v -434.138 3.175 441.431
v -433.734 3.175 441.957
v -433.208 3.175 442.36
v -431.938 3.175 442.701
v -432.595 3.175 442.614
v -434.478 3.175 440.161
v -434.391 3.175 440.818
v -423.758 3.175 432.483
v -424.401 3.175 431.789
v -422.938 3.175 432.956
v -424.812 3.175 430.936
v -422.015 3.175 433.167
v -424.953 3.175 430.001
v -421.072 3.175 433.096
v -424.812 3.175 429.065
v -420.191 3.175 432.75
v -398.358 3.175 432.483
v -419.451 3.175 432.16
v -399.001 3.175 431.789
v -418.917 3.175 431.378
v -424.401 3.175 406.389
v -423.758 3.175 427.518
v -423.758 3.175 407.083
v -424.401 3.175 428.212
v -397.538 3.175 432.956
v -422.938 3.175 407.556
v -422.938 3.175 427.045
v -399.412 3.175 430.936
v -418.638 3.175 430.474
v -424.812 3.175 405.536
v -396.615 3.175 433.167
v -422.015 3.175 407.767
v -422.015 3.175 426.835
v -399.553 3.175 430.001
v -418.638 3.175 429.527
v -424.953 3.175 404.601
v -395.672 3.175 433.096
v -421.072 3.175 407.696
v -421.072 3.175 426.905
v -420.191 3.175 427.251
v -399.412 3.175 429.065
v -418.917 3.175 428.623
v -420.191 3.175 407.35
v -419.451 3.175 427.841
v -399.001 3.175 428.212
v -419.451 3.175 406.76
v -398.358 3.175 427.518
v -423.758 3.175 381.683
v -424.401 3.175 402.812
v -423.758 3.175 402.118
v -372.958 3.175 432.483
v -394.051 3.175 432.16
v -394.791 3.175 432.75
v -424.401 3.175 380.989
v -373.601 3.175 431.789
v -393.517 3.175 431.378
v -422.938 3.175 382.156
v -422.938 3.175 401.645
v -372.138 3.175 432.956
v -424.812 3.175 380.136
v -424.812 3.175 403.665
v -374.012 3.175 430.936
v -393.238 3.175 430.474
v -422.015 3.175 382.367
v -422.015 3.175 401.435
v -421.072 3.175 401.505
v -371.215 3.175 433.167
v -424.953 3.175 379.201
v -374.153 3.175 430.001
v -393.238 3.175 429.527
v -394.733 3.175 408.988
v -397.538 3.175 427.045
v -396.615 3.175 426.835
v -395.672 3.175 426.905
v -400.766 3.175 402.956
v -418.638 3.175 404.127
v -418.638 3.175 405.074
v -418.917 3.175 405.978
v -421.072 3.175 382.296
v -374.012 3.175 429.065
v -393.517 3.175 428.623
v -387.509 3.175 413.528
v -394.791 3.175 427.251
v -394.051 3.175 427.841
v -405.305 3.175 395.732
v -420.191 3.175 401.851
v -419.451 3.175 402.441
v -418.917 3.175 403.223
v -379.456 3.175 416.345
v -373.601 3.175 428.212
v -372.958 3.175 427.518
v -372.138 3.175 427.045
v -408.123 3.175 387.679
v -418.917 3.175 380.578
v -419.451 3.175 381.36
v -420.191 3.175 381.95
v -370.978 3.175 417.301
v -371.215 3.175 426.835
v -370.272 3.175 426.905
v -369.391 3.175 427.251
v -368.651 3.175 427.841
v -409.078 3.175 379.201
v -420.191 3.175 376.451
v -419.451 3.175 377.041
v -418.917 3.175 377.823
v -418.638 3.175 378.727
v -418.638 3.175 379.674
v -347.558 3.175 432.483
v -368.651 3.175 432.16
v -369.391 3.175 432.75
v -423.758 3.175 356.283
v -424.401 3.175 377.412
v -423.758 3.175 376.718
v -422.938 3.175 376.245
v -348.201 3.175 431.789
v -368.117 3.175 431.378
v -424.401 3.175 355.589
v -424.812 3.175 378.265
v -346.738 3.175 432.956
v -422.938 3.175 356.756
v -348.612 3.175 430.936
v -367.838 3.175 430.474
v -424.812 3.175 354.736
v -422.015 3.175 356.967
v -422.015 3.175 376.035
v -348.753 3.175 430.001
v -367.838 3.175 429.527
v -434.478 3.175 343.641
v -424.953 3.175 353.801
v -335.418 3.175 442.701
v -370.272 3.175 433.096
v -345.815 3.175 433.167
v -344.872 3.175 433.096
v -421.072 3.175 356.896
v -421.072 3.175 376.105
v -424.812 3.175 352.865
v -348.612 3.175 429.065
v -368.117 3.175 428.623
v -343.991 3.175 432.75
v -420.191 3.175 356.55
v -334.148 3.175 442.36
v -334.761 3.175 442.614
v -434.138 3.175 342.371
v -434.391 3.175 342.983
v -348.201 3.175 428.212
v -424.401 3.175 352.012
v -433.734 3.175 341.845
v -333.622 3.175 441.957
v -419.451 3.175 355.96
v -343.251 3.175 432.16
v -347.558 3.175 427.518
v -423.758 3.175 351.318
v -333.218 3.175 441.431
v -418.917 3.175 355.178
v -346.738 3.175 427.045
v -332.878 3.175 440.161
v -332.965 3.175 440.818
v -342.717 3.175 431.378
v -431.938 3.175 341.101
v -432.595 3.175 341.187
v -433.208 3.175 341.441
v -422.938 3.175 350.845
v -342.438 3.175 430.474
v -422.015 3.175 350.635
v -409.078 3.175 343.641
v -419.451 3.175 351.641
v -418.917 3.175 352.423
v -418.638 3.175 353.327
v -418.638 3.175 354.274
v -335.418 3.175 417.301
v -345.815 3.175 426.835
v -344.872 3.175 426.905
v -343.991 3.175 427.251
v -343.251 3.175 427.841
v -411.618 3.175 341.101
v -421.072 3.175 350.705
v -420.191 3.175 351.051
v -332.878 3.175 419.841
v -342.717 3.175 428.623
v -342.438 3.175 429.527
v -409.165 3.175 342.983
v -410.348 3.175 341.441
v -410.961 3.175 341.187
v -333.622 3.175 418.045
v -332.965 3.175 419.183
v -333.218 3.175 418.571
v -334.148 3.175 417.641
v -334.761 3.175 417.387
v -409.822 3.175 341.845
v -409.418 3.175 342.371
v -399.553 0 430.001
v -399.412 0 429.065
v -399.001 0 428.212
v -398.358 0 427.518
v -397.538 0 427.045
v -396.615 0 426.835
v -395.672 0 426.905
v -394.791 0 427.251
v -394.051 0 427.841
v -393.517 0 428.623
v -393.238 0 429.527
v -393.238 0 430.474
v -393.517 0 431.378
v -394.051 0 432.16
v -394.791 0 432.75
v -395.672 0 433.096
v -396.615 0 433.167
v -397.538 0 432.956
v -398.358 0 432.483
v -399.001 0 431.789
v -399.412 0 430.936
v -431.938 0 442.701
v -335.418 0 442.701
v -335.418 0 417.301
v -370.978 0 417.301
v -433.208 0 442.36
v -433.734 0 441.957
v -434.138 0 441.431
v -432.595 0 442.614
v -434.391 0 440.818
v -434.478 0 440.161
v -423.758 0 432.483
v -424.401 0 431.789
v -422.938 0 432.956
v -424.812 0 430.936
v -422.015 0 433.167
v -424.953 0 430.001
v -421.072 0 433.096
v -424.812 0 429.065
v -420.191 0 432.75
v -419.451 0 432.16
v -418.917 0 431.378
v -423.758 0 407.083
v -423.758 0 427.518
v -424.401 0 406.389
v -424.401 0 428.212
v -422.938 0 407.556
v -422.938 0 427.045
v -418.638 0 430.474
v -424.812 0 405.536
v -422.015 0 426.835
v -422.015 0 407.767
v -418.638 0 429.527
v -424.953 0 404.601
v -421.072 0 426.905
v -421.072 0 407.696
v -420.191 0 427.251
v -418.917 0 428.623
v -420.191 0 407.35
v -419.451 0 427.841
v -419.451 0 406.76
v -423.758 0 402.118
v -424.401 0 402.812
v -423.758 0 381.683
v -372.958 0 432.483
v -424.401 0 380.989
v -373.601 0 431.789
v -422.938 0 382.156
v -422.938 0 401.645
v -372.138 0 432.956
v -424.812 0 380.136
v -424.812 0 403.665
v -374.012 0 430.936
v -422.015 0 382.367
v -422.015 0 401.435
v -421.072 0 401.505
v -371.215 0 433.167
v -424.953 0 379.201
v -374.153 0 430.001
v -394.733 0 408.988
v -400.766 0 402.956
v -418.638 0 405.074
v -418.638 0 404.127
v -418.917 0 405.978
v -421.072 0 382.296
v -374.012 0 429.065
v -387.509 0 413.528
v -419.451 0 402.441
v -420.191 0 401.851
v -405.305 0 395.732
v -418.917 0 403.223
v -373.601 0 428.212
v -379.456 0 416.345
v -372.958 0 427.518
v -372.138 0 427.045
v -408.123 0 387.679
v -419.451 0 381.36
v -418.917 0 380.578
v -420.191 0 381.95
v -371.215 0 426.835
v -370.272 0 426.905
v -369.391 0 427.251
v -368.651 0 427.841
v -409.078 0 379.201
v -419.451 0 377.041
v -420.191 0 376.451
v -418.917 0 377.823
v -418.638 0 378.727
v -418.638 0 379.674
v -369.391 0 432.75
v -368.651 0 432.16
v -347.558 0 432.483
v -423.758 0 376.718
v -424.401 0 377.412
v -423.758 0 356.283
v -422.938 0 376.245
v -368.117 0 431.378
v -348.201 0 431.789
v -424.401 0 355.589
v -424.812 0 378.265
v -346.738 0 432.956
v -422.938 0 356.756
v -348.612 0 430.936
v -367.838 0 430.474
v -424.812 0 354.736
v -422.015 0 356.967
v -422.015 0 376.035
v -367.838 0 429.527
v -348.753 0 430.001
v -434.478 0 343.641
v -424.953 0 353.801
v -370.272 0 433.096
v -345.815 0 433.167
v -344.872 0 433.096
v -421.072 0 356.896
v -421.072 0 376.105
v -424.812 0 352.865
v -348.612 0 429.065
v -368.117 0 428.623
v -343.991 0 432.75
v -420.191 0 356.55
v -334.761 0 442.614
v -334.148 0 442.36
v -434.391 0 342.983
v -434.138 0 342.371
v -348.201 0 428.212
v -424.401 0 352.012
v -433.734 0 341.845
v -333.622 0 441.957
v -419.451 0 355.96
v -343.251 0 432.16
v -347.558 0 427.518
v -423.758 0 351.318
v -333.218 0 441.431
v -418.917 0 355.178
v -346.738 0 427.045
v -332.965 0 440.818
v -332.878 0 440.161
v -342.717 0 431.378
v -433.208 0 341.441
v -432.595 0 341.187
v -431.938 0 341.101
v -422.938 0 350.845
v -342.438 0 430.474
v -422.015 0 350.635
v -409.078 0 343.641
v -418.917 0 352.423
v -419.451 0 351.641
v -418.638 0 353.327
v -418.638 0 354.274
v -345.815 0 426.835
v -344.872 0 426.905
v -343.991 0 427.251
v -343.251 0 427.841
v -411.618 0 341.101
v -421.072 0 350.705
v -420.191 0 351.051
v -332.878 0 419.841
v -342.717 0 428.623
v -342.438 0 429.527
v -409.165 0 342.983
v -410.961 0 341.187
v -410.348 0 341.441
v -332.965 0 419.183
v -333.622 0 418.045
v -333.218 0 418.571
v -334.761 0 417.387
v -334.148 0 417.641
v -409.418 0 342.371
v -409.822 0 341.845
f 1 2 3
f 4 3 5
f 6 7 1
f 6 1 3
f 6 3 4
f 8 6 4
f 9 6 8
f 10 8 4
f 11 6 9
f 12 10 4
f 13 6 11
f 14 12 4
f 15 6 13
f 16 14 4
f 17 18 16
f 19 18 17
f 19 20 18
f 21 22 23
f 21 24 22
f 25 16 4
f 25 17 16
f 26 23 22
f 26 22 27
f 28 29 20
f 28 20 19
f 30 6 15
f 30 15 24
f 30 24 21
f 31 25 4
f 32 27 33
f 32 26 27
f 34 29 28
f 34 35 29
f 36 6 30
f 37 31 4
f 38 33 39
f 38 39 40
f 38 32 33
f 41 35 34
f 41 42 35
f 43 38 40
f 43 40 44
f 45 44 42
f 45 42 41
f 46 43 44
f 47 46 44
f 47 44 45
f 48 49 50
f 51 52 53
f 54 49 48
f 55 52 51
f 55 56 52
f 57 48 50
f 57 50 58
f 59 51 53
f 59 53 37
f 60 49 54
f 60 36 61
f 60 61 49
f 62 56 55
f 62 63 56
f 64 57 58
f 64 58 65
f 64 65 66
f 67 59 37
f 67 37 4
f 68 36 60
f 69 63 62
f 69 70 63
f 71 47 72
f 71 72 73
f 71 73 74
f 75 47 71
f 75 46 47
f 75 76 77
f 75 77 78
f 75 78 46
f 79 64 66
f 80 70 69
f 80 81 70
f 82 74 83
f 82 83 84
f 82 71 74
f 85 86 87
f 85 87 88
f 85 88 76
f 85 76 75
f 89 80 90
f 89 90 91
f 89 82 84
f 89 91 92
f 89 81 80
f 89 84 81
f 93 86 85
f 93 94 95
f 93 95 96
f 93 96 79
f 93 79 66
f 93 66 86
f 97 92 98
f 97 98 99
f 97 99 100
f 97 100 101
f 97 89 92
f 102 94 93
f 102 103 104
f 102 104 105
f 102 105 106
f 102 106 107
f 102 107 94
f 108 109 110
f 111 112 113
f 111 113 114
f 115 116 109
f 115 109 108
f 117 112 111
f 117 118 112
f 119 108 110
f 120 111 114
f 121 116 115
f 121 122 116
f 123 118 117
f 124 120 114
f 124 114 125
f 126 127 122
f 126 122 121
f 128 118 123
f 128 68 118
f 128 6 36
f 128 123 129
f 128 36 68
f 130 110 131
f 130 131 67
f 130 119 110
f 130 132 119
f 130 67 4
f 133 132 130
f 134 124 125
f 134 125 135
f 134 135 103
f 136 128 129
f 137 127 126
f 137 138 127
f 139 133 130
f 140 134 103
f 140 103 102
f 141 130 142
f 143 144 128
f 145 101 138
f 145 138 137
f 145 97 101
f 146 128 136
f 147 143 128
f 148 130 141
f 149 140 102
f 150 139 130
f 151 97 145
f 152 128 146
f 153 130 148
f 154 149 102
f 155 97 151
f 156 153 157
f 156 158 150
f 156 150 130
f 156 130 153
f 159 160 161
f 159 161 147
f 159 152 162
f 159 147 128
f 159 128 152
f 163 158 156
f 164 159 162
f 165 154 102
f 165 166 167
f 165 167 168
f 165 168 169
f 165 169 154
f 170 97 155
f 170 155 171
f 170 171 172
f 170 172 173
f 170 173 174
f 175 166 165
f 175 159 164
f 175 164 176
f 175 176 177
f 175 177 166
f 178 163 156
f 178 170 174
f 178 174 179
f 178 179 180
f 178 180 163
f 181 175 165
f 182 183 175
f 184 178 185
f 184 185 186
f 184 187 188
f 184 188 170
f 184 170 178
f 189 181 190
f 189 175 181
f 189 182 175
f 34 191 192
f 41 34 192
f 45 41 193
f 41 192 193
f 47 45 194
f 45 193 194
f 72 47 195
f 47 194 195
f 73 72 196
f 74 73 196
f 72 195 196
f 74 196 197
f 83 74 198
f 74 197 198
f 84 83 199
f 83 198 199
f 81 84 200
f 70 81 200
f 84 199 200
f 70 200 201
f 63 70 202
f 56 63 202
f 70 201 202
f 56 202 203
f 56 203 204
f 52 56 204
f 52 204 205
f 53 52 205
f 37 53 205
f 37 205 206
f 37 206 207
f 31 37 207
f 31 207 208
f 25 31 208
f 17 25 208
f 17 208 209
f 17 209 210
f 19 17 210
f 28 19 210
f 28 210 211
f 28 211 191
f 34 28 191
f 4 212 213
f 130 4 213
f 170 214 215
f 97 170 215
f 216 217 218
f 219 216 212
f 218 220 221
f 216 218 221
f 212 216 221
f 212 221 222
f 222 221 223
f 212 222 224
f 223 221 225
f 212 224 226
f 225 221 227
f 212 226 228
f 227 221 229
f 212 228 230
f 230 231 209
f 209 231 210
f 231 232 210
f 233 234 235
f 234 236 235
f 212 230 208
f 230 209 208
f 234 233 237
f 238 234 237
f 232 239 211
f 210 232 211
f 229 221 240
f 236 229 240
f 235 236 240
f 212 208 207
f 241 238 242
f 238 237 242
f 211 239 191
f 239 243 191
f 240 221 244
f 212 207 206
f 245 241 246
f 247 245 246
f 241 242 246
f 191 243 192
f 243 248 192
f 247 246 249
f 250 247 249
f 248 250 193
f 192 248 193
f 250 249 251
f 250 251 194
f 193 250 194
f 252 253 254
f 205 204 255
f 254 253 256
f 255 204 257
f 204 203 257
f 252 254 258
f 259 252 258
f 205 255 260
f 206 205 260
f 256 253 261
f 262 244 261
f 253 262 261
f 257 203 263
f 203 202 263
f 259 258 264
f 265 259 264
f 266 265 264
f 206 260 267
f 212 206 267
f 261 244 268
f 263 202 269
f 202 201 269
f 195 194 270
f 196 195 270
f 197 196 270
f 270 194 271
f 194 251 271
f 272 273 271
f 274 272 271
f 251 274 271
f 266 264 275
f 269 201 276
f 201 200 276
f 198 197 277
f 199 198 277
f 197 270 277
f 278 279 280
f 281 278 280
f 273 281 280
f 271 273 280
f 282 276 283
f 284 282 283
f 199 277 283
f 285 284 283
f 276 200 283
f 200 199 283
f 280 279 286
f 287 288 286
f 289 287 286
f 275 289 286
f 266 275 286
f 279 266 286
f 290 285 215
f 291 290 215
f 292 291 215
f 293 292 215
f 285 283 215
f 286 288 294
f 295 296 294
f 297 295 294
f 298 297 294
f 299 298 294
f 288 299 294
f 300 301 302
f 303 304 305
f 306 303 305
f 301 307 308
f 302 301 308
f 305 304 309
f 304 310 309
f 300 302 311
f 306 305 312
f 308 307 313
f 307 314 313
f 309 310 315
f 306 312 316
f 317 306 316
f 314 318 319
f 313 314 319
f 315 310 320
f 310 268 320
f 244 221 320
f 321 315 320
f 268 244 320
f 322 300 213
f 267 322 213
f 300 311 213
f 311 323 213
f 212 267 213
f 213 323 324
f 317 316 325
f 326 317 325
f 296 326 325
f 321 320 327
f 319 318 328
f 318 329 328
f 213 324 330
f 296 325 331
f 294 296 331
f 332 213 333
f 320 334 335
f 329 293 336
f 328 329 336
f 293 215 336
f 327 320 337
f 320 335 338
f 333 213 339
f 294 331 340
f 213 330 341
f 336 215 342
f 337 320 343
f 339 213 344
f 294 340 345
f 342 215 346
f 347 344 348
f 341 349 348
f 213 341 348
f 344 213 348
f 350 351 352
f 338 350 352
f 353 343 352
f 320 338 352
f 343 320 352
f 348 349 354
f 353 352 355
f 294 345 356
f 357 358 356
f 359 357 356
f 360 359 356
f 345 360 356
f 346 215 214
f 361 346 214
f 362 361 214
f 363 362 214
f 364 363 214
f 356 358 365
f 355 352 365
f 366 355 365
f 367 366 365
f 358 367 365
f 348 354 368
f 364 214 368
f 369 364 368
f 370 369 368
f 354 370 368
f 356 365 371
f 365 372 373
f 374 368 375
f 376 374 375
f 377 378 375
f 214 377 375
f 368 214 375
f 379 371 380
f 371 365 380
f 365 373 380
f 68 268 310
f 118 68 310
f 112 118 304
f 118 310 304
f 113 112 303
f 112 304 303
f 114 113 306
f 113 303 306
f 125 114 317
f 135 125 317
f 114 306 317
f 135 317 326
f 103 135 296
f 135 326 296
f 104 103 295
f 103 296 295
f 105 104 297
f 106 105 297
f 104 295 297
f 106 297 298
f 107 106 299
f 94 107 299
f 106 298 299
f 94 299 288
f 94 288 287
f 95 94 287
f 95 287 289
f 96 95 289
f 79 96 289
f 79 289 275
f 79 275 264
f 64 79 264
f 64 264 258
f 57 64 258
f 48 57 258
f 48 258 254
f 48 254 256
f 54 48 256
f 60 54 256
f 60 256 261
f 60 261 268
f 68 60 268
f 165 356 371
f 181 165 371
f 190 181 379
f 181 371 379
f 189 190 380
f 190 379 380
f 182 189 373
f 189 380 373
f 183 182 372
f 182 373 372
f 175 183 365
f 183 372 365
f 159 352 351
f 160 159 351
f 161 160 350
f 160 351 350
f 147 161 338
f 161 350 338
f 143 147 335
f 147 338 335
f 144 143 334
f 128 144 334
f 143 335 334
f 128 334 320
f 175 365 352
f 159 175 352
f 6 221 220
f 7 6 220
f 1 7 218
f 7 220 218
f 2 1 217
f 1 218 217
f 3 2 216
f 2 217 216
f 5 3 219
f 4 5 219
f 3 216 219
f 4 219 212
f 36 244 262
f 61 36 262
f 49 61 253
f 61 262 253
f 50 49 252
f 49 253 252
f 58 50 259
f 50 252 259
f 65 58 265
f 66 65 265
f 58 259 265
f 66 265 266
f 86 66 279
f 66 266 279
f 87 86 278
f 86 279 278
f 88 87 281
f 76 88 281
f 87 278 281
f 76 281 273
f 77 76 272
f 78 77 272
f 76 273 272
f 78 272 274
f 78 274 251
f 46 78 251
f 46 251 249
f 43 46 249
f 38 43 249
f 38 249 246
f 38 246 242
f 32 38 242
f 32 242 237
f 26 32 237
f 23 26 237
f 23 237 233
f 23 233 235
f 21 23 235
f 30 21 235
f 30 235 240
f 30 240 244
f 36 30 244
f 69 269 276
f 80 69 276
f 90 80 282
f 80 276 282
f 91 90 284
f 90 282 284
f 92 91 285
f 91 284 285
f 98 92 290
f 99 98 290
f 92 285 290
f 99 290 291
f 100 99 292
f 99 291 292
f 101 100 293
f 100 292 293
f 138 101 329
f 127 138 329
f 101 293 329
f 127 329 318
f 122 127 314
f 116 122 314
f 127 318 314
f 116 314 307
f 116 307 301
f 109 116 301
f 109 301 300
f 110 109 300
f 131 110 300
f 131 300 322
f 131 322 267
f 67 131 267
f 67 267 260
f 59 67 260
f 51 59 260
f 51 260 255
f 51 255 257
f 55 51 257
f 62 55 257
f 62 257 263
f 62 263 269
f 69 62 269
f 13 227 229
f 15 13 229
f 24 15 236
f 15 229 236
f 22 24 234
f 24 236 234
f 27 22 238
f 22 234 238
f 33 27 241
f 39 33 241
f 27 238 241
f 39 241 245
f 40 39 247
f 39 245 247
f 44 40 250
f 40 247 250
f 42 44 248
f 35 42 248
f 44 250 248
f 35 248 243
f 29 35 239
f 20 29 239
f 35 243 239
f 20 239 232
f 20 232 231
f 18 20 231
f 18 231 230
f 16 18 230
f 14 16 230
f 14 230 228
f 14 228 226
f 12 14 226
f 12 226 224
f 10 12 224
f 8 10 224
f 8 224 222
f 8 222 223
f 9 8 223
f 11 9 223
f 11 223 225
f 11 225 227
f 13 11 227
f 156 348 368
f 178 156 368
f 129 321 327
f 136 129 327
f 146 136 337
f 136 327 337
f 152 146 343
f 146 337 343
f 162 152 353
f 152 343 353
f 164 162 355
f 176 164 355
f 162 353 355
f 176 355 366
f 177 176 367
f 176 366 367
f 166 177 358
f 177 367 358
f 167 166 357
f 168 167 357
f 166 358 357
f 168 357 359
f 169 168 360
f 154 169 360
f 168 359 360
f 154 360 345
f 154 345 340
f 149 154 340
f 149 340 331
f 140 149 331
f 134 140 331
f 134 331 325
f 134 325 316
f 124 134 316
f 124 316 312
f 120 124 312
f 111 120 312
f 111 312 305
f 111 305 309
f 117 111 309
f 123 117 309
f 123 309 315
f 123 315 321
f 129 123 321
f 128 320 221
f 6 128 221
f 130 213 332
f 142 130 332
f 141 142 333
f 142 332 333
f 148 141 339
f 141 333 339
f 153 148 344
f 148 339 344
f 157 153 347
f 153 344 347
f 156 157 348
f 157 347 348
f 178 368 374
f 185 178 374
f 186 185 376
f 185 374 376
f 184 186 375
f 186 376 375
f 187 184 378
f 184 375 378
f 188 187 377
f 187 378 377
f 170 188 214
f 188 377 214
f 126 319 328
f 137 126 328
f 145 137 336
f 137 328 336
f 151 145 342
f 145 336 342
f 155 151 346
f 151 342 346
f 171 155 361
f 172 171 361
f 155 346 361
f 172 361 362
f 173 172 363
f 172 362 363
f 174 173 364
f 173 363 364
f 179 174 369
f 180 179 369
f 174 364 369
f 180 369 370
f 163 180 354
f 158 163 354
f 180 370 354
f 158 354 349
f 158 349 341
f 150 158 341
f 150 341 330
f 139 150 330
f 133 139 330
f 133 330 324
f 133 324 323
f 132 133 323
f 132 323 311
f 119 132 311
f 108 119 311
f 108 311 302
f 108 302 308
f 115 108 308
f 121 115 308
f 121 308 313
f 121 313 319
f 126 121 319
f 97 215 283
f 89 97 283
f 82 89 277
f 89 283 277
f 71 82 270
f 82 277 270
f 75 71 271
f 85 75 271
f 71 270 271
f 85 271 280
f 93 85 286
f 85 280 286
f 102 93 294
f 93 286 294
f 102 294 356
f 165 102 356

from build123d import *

# Parameters (mm, degrees)
BOSS_EXTRUDE1_DEPTH         = 3.175
F_1_4_0_25_DIAMETER_HOLE1_D = 6.35
F_1_4_0_25_DIAMETER_HOLE2_D = 6.35


with BuildPart() as part:
    # Sketch2 → Boss-Extrude1 (new body)
    with BuildSketch(Plane(origin=(0, 0, 0), x_dir=(1, 0, 0), z_dir=(0, 1, 0))):
        with BuildLine():
            Line((-431.938028743, -442.700646237), (-335.418028743, -442.700646237))
            ThreePointArc((-335.418028743, -442.700646237), (-333.621977519, -441.956697461), (-332.878028743, -440.160646237))
            Line((-332.878028743, -440.160646237), (-332.878028743, -419.840646237))
            ThreePointArc((-332.878028743, -419.840646237), (-333.621977519, -418.044595013), (-335.418028743, -417.300646237))
            Line((-335.418028743, -417.300646237), (-370.978028743, -417.300646237))
            ThreePointArc((-370.978028743, -417.300646237), (-397.918797106, -406.1414146), (-409.078028743, -379.200646237))
            Line((-409.078028743, -379.200646237), (-409.078028743, -343.640646237))
            ThreePointArc((-409.078028743, -343.640646237), (-409.821977519, -341.844595013), (-411.618028743, -341.100646237))
            Line((-411.618028743, -341.100646237), (-431.938028743, -341.100646237))
            ThreePointArc((-431.938028743, -341.100646237), (-433.734079967, -341.844595013), (-434.478028743, -343.640646237))
            Line((-434.478028743, -343.640646237), (-434.478028743, -440.160646237))
            ThreePointArc((-434.478028743, -440.160646237), (-433.734079967, -441.956697461), (-431.938028743, -442.700646237))
        make_face()
    extrude(amount=BOSS_EXTRUDE1_DEPTH)

    # 1/4 (0.25) Diameter Hole1 (through all)
    with Locations(Plane(origin=(0, 3.175, 0), x_dir=(1, 0, 0), z_dir=(0, 1, 0))):
        with Locations((-421.778028743, -353.800646237), (-421.778028743, -379.200646237), (-370.978028743, -430.000646237), (-345.578028743, -430.000646237)):
            Hole(F_1_4_0_25_DIAMETER_HOLE1_D / 2)

    # 1/4 (0.25) Diameter Hole2 (through all)
    with Locations(Plane(origin=(0, 3.175, 0), x_dir=(1, 0, 0), z_dir=(0, 1, 0))):
        with Locations((-421.778028743, -430.000646237), (-396.378028743, -430.000646237), (-421.778028743, -404.600646237)):
            Hole(F_1_4_0_25_DIAMETER_HOLE2_D / 2)


solid = part.part
